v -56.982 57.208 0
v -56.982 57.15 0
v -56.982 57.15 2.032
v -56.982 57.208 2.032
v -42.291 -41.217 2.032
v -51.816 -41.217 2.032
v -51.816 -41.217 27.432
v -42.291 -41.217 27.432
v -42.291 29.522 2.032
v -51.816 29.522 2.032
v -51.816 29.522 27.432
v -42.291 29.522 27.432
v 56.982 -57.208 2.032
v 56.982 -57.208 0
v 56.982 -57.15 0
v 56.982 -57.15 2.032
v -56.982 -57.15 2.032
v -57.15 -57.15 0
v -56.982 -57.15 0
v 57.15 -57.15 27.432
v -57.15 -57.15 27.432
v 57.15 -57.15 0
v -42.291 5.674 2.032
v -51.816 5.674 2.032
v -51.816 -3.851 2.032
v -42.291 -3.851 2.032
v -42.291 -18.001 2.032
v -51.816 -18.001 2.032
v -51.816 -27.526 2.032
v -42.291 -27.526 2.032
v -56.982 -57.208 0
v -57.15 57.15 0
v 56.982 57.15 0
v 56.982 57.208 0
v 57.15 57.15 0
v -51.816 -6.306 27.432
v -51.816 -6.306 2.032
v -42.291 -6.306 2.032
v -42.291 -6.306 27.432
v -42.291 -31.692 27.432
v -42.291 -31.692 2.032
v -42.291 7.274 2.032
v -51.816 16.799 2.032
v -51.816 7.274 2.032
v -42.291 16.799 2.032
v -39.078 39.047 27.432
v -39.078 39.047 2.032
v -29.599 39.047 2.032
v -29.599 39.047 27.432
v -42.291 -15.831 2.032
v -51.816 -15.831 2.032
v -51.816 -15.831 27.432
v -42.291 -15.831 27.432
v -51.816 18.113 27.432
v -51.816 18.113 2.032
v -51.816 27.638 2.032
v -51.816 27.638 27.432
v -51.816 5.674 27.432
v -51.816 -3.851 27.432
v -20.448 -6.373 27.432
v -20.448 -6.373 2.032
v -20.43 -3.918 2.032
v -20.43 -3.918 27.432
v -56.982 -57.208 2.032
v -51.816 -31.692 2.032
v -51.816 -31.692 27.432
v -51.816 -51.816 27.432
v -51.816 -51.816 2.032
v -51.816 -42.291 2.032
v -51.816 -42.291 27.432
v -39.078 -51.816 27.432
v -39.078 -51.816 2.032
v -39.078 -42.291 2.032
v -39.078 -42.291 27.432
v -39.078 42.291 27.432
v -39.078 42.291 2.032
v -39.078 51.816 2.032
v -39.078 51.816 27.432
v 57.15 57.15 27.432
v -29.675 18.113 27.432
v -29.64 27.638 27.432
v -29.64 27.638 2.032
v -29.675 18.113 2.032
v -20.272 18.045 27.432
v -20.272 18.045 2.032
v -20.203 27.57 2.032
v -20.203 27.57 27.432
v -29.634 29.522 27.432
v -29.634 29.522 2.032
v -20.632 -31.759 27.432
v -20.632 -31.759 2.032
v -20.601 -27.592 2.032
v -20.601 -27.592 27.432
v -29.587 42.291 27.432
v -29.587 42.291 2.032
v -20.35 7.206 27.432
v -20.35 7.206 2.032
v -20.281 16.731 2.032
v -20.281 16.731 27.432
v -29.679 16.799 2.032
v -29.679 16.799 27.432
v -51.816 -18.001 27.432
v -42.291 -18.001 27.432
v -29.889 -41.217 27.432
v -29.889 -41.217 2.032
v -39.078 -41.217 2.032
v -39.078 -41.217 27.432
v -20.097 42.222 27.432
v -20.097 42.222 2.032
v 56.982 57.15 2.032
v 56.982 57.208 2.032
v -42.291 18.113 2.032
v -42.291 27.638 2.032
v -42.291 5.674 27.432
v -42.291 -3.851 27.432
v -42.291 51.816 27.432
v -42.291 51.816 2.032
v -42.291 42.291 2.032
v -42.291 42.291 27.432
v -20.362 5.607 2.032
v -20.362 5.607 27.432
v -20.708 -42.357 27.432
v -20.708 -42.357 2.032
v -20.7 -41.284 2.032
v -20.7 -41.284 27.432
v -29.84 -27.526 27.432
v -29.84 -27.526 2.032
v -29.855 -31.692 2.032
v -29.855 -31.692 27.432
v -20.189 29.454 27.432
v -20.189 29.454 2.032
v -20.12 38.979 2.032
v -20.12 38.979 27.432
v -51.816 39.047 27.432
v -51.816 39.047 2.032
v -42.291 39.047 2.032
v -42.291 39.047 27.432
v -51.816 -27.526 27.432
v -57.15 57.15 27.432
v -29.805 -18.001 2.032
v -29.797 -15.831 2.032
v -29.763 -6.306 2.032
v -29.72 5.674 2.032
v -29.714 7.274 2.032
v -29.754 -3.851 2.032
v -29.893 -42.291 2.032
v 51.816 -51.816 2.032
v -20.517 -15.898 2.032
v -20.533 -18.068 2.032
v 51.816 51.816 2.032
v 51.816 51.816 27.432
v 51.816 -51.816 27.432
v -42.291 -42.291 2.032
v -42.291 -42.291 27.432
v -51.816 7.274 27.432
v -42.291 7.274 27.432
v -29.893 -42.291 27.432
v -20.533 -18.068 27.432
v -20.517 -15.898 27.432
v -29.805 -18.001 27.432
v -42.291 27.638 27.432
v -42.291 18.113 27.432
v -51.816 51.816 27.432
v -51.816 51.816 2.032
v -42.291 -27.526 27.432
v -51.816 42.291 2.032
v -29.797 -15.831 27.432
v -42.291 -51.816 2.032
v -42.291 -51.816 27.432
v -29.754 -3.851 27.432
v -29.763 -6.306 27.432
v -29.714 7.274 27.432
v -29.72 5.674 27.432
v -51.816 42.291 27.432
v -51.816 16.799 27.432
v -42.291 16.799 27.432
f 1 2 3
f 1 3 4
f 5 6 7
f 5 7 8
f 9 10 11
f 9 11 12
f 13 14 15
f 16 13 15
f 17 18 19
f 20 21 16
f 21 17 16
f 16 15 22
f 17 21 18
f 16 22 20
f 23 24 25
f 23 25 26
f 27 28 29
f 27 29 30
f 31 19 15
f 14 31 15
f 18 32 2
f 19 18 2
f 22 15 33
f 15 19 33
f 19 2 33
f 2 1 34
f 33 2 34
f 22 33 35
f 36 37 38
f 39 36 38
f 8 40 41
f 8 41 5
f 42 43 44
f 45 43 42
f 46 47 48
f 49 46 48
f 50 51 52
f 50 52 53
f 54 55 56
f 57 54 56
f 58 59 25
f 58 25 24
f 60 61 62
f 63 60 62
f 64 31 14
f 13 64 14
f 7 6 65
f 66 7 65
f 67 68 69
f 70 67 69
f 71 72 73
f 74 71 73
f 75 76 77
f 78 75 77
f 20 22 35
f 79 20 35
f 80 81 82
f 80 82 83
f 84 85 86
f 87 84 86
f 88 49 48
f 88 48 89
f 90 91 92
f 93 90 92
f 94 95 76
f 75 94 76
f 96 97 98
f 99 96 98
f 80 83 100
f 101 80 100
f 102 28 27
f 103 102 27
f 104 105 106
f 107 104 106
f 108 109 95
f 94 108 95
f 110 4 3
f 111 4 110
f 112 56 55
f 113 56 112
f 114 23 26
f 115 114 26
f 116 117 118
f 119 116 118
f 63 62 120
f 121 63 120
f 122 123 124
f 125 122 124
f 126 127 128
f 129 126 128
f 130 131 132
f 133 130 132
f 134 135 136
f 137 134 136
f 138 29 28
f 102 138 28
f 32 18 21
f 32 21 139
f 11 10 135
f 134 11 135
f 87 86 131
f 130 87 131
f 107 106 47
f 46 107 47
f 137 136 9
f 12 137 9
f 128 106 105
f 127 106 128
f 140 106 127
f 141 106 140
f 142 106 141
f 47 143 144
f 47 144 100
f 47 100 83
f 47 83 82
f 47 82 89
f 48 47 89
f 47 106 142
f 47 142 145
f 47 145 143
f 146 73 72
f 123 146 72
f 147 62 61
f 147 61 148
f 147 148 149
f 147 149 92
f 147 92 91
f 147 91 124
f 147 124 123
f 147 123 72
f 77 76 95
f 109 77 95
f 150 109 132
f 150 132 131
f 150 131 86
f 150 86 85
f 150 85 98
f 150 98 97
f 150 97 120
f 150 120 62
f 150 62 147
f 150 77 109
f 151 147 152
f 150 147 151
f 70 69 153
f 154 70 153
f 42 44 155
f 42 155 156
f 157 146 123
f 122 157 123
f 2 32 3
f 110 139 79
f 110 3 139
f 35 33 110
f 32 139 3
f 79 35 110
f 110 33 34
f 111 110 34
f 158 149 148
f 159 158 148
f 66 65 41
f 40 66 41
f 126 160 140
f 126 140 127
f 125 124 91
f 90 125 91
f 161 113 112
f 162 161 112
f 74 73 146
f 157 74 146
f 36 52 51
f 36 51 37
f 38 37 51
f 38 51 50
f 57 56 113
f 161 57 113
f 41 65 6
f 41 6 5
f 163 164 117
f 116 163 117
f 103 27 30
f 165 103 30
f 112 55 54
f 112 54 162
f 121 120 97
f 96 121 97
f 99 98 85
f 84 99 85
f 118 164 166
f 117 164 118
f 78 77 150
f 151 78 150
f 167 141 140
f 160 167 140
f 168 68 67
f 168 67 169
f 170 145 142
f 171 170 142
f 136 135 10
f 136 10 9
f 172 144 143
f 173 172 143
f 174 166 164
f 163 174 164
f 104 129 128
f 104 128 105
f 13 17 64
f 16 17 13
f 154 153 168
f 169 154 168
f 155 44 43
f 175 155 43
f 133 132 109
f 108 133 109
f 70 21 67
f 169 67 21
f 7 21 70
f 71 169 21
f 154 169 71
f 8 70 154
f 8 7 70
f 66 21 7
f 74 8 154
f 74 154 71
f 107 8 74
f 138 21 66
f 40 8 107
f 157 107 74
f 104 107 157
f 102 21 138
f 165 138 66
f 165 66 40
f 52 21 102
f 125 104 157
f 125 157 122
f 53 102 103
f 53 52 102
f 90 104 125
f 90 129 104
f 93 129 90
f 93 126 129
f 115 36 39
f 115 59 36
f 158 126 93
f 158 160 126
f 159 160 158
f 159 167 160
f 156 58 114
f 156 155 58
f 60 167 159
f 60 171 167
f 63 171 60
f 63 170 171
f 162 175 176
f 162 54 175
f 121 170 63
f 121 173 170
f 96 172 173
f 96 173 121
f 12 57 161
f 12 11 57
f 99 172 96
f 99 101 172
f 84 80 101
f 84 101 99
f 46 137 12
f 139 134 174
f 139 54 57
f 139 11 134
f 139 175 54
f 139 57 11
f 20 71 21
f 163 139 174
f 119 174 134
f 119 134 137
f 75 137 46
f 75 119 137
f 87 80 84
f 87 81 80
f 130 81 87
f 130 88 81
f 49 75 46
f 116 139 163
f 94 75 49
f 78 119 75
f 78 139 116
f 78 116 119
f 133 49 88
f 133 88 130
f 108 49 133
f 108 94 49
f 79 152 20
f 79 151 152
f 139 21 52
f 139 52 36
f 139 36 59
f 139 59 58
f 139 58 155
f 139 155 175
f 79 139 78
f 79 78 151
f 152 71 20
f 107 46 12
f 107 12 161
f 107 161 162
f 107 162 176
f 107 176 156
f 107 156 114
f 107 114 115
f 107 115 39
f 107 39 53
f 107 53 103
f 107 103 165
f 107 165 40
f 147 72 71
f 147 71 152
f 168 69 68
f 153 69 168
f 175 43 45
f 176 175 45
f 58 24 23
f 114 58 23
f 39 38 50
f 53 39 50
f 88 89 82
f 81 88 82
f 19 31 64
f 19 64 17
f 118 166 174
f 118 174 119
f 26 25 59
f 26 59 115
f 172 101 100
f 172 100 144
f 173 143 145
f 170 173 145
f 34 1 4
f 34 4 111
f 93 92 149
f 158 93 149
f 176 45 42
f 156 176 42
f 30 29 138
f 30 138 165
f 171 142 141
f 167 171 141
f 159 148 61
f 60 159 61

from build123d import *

# Parameters (mm, degrees)
F0_W     = 114.3
F0_H     = 114.3
F0_W_2   = 103.632
F0_H_2   = 103.632
F1_DEPTH = 27.432
F2_W     = 113.9637678862
F2_H     = 114.4161000848
F3_DEPTH = 2.032
F4_W     = 9.525
F4_H     = 3.2435940627
F4_H_2   = 1.884625411
F4_H_3   = 1.314143768
F4_H_4   = 1.599385288
F4_H_5   = 2.4551072869
F4_H_6   = 2.1698671639
F4_H_7   = 4.1665482581
F4_H_8   = 1.0737287614
F5_DEPTH = 25.4
F6_DEPTH = 25.4


with BuildPart() as f1:
    # F0 (on Top) → F1 (new body)
    with BuildSketch(Plane.XY):
        Rectangle(F0_W, F0_H)
        Rectangle(F0_W_2, F0_H_2, mode=Mode.SUBTRACT)
    extrude(amount=F1_DEPTH)

    # F2 (on Top) → F3 (join)
    with BuildSketch(Plane.XY):
        Rectangle(F2_W, F2_H)
    extrude(amount=F3_DEPTH)

    # F4 (on face) → F5 (join)
    with BuildSketch(Plane.XY.offset(2.032)):
        Polygon((-39.0779674053, 51.816), (-42.291, 51.816), (-42.291, 42.291), (-42.291, 39.0474059373), (-42.291, 29.5224059373), (-42.291, 27.6377805263), (-42.291, 18.1127805263), (-42.291, 16.7986367583), (-42.291, 7.2736367583), (-42.291, 5.6742514703), (-42.291, -3.8507485297), (-42.291, -6.3058558166), (-42.291, -15.8308558166), (-42.291, -18.0007229805), (-42.291, -27.5257229805), (-42.291, -31.6922712386), (-42.291, -41.2172712386), (-42.291, -42.291), (-42.291, -51.816), (-39.0779674053, -51.816), (-39.0779674053, -42.291), (-39.0779674053, -41.2172712386), (-39.0779674053, -31.6922712386), (-39.0779674053, -27.5257229805), (-39.0779674053, -18.0007229805), (-39.0779674053, -15.8308558166), (-39.0779674053, -6.3058558166), (-39.0779674053, -3.8507485297), (-39.0779674053, 5.6742514703), (-39.0779674053, 7.2736367583), (-39.0779674053, 16.7986367583), (-39.0779674053, 18.1127805263), (-39.0779674053, 27.6377805263), (-39.0779674053, 29.5224059373), (-39.0779674053, 39.0474059373), (-39.0779674053, 42.291), align=None)
        with Locations((-47.0535, 40.6692029687)):
            Rectangle(F4_W, F4_H)
        Polygon((-29.5873772812, 42.291), (-39.0779674053, 42.291), (-39.0779674053, 39.0474059373), (-29.5990950418, 39.0474059373), align=None)
        Polygon((-20.097034873, 42.2224297603), (-29.5873772812, 42.291), (-29.5990950418, 39.0474059373), (-20.1204700883, 38.9789203593), align=None)
        with Locations((-47.0535, 28.5800932318)):
            Rectangle(F4_W, F4_H_2)
        Polygon((-20.1204700883, 38.9789203593), (-29.5990950418, 39.0474059373), (-29.6335049177, 29.5224059373), (-20.189288942, 29.4541689733), align=None)
        Polygon((-20.189288942, 29.4541689733), (-29.6335049177, 29.5224059373), (-29.640313288, 27.6377805263), (-20.2029055048, 27.5695927533), align=None)
        with Locations((-47.0535, 17.4557086423)):
            Rectangle(F4_W, F4_H_3)
        Polygon((-20.2029055048, 27.5695927533), (-29.640313288, 27.6377805263), (-29.6747231639, 18.1127805263), (-20.2717243585, 18.0448413672), align=None)
        Polygon((-20.2717243585, 18.0448413672), (-29.6747231639, 18.1127805263), (-29.6794706205, 16.7986367583), (-20.2812191477, 16.7307319), align=None)
        with Locations((-47.0535, 6.4739441143)):
            Rectangle(F4_W, F4_H_4)
        Polygon((-20.2812191477, 16.7307319), (-29.6794706205, 16.7986367583), (-29.7138804964, 7.2736367583), (-20.3500380015, 7.205980514), align=None)
        Polygon((-20.3500380015, 7.205980514), (-29.7138804964, 7.2736367583), (-29.7196584123, 5.6742514703), (-20.3615936825, 5.6066369719), align=None)
        with Locations((-47.0535, -5.0783021731)):
            Rectangle(F4_W, F4_H_5)
        Polygon((-20.3615936825, 5.6066369719), (-29.7196584123, 5.6742514703), (-29.7540682883, -3.8507485297), (-20.4304125362, -3.9181144141), align=None)
        Polygon((-20.4304125362, -3.9181144141), (-29.7540682883, -3.8507485297), (-29.762937573, -6.3058558166), (-20.4481508742, -6.3731576198), align=None)
        with Locations((-47.0535, -16.9157893986)):
            Rectangle(F4_W, F4_H_6)
        Polygon((-20.4481508742, -6.3731576198), (-29.762937573, -6.3058558166), (-29.7973474489, -15.8308558166), (-20.5169697279, -15.8979090058), align=None)
        Polygon((-20.5169697279, -15.8979090058), (-29.7973474489, -15.8308558166), (-29.8051862794, -18.0007229805), (-20.5326471842, -18.0677195336), align=None)
        with Locations((-47.0535, -29.6089971095)):
            Rectangle(F4_W, F4_H_7)
        Polygon((-20.5326471842, -18.0677195336), (-29.8051862794, -18.0007229805), (-29.8395961553, -27.5257229805), (-20.6014660379, -27.5924709196), align=None)
        Polygon((-20.6014660379, -27.5924709196), (-29.8395961553, -27.5257229805), (-29.8546481667, -31.6922712386), (-20.6315696678, -31.7589104257), align=None)
        with Locations((-47.0535, -41.7541356193)):
            Rectangle(F4_W, F4_H_8)
        Polygon((-29.8890580426, -41.2172712386), (-39.0779674053, -41.2172712386), (-39.0779674053, -42.291), (-29.8929369795, -42.291), align=None)
        Polygon((-20.6315696678, -31.7589104257), (-29.8546481667, -31.6922712386), (-29.8890580426, -41.2172712386), (-20.7003885216, -41.2836618117), align=None)
        Polygon((-20.7003885216, -41.2836618117), (-29.8890580426, -41.2172712386), (-29.8929369795, -42.291), (-20.708146294, -42.3573625475), align=None)
    extrude(amount=F5_DEPTH)

    # F4 (on face) → F6 (join)
    with BuildSketch(Plane.XY.offset(2.032)):
        Polygon((-39.0779674053, 51.816), (-42.291, 51.816), (-42.291, 42.291), (-42.291, 39.0474059373), (-42.291, 29.5224059373), (-42.291, 27.6377805263), (-42.291, 18.1127805263), (-42.291, 16.7986367583), (-42.291, 7.2736367583), (-42.291, 5.6742514703), (-42.291, -3.8507485297), (-42.291, -6.3058558166), (-42.291, -15.8308558166), (-42.291, -18.0007229805), (-42.291, -27.5257229805), (-42.291, -31.6922712386), (-42.291, -41.2172712386), (-42.291, -42.291), (-42.291, -51.816), (-39.0779674053, -51.816), (-39.0779674053, -42.291), (-39.0779674053, -41.2172712386), (-39.0779674053, -31.6922712386), (-39.0779674053, -27.5257229805), (-39.0779674053, -18.0007229805), (-39.0779674053, -15.8308558166), (-39.0779674053, -6.3058558166), (-39.0779674053, -3.8507485297), (-39.0779674053, 5.6742514703), (-39.0779674053, 7.2736367583), (-39.0779674053, 16.7986367583), (-39.0779674053, 18.1127805263), (-39.0779674053, 27.6377805263), (-39.0779674053, 29.5224059373), (-39.0779674053, 39.0474059373), (-39.0779674053, 42.291), align=None)
        with Locations((-47.0535, 40.6692029687)):
            Rectangle(F4_W, F4_H)
        Polygon((-29.5873772812, 42.291), (-39.0779674053, 42.291), (-39.0779674053, 39.0474059373), (-29.5990950418, 39.0474059373), align=None)
        Polygon((-20.097034873, 42.2224297603), (-29.5873772812, 42.291), (-29.5990950418, 39.0474059373), (-20.1204700883, 38.9789203593), align=None)
        with Locations((-47.0535, 28.5800932318)):
            Rectangle(F4_W, F4_H_2)
        Polygon((-20.1204700883, 38.9789203593), (-29.5990950418, 39.0474059373), (-29.6335049177, 29.5224059373), (-20.189288942, 29.4541689733), align=None)
        Polygon((-20.189288942, 29.4541689733), (-29.6335049177, 29.5224059373), (-29.640313288, 27.6377805263), (-20.2029055048, 27.5695927533), align=None)
        with Locations((-47.0535, 17.4557086423)):
            Rectangle(F4_W, F4_H_3)
        Polygon((-20.2029055048, 27.5695927533), (-29.640313288, 27.6377805263), (-29.6747231639, 18.1127805263), (-20.2717243585, 18.0448413672), align=None)
        Polygon((-20.2717243585, 18.0448413672), (-29.6747231639, 18.1127805263), (-29.6794706205, 16.7986367583), (-20.2812191477, 16.7307319), align=None)
        with Locations((-47.0535, 6.4739441143)):
            Rectangle(F4_W, F4_H_4)
        Polygon((-20.2812191477, 16.7307319), (-29.6794706205, 16.7986367583), (-29.7138804964, 7.2736367583), (-20.3500380015, 7.205980514), align=None)
        Polygon((-20.3500380015, 7.205980514), (-29.7138804964, 7.2736367583), (-29.7196584123, 5.6742514703), (-20.3615936825, 5.6066369719), align=None)
        with Locations((-47.0535, -5.0783021731)):
            Rectangle(F4_W, F4_H_5)
        Polygon((-20.3615936825, 5.6066369719), (-29.7196584123, 5.6742514703), (-29.7540682883, -3.8507485297), (-20.4304125362, -3.9181144141), align=None)
        Polygon((-20.4304125362, -3.9181144141), (-29.7540682883, -3.8507485297), (-29.762937573, -6.3058558166), (-20.4481508742, -6.3731576198), align=None)
        with Locations((-47.0535, -16.9157893986)):
            Rectangle(F4_W, F4_H_6)
        Polygon((-20.4481508742, -6.3731576198), (-29.762937573, -6.3058558166), (-29.7973474489, -15.8308558166), (-20.5169697279, -15.8979090058), align=None)
        Polygon((-20.5169697279, -15.8979090058), (-29.7973474489, -15.8308558166), (-29.8051862794, -18.0007229805), (-20.5326471842, -18.0677195336), align=None)
        with Locations((-47.0535, -29.6089971095)):
            Rectangle(F4_W, F4_H_7)
        Polygon((-20.5326471842, -18.0677195336), (-29.8051862794, -18.0007229805), (-29.8395961553, -27.5257229805), (-20.6014660379, -27.5924709196), align=None)
        Polygon((-20.6014660379, -27.5924709196), (-29.8395961553, -27.5257229805), (-29.8546481667, -31.6922712386), (-20.6315696678, -31.7589104257), align=None)
        with Locations((-47.0535, -41.7541356193)):
            Rectangle(F4_W, F4_H_8)
        Polygon((-29.8890580426, -41.2172712386), (-39.0779674053, -41.2172712386), (-39.0779674053, -42.291), (-29.8929369795, -42.291), align=None)
        Polygon((-20.6315696678, -31.7589104257), (-29.8546481667, -31.6922712386), (-29.8890580426, -41.2172712386), (-20.7003885216, -41.2836618117), align=None)
        Polygon((-20.7003885216, -41.2836618117), (-29.8890580426, -41.2172712386), (-29.8929369795, -42.291), (-20.708146294, -42.3573625475), align=None)
    extrude(amount=F6_DEPTH)


solid = f1.part
